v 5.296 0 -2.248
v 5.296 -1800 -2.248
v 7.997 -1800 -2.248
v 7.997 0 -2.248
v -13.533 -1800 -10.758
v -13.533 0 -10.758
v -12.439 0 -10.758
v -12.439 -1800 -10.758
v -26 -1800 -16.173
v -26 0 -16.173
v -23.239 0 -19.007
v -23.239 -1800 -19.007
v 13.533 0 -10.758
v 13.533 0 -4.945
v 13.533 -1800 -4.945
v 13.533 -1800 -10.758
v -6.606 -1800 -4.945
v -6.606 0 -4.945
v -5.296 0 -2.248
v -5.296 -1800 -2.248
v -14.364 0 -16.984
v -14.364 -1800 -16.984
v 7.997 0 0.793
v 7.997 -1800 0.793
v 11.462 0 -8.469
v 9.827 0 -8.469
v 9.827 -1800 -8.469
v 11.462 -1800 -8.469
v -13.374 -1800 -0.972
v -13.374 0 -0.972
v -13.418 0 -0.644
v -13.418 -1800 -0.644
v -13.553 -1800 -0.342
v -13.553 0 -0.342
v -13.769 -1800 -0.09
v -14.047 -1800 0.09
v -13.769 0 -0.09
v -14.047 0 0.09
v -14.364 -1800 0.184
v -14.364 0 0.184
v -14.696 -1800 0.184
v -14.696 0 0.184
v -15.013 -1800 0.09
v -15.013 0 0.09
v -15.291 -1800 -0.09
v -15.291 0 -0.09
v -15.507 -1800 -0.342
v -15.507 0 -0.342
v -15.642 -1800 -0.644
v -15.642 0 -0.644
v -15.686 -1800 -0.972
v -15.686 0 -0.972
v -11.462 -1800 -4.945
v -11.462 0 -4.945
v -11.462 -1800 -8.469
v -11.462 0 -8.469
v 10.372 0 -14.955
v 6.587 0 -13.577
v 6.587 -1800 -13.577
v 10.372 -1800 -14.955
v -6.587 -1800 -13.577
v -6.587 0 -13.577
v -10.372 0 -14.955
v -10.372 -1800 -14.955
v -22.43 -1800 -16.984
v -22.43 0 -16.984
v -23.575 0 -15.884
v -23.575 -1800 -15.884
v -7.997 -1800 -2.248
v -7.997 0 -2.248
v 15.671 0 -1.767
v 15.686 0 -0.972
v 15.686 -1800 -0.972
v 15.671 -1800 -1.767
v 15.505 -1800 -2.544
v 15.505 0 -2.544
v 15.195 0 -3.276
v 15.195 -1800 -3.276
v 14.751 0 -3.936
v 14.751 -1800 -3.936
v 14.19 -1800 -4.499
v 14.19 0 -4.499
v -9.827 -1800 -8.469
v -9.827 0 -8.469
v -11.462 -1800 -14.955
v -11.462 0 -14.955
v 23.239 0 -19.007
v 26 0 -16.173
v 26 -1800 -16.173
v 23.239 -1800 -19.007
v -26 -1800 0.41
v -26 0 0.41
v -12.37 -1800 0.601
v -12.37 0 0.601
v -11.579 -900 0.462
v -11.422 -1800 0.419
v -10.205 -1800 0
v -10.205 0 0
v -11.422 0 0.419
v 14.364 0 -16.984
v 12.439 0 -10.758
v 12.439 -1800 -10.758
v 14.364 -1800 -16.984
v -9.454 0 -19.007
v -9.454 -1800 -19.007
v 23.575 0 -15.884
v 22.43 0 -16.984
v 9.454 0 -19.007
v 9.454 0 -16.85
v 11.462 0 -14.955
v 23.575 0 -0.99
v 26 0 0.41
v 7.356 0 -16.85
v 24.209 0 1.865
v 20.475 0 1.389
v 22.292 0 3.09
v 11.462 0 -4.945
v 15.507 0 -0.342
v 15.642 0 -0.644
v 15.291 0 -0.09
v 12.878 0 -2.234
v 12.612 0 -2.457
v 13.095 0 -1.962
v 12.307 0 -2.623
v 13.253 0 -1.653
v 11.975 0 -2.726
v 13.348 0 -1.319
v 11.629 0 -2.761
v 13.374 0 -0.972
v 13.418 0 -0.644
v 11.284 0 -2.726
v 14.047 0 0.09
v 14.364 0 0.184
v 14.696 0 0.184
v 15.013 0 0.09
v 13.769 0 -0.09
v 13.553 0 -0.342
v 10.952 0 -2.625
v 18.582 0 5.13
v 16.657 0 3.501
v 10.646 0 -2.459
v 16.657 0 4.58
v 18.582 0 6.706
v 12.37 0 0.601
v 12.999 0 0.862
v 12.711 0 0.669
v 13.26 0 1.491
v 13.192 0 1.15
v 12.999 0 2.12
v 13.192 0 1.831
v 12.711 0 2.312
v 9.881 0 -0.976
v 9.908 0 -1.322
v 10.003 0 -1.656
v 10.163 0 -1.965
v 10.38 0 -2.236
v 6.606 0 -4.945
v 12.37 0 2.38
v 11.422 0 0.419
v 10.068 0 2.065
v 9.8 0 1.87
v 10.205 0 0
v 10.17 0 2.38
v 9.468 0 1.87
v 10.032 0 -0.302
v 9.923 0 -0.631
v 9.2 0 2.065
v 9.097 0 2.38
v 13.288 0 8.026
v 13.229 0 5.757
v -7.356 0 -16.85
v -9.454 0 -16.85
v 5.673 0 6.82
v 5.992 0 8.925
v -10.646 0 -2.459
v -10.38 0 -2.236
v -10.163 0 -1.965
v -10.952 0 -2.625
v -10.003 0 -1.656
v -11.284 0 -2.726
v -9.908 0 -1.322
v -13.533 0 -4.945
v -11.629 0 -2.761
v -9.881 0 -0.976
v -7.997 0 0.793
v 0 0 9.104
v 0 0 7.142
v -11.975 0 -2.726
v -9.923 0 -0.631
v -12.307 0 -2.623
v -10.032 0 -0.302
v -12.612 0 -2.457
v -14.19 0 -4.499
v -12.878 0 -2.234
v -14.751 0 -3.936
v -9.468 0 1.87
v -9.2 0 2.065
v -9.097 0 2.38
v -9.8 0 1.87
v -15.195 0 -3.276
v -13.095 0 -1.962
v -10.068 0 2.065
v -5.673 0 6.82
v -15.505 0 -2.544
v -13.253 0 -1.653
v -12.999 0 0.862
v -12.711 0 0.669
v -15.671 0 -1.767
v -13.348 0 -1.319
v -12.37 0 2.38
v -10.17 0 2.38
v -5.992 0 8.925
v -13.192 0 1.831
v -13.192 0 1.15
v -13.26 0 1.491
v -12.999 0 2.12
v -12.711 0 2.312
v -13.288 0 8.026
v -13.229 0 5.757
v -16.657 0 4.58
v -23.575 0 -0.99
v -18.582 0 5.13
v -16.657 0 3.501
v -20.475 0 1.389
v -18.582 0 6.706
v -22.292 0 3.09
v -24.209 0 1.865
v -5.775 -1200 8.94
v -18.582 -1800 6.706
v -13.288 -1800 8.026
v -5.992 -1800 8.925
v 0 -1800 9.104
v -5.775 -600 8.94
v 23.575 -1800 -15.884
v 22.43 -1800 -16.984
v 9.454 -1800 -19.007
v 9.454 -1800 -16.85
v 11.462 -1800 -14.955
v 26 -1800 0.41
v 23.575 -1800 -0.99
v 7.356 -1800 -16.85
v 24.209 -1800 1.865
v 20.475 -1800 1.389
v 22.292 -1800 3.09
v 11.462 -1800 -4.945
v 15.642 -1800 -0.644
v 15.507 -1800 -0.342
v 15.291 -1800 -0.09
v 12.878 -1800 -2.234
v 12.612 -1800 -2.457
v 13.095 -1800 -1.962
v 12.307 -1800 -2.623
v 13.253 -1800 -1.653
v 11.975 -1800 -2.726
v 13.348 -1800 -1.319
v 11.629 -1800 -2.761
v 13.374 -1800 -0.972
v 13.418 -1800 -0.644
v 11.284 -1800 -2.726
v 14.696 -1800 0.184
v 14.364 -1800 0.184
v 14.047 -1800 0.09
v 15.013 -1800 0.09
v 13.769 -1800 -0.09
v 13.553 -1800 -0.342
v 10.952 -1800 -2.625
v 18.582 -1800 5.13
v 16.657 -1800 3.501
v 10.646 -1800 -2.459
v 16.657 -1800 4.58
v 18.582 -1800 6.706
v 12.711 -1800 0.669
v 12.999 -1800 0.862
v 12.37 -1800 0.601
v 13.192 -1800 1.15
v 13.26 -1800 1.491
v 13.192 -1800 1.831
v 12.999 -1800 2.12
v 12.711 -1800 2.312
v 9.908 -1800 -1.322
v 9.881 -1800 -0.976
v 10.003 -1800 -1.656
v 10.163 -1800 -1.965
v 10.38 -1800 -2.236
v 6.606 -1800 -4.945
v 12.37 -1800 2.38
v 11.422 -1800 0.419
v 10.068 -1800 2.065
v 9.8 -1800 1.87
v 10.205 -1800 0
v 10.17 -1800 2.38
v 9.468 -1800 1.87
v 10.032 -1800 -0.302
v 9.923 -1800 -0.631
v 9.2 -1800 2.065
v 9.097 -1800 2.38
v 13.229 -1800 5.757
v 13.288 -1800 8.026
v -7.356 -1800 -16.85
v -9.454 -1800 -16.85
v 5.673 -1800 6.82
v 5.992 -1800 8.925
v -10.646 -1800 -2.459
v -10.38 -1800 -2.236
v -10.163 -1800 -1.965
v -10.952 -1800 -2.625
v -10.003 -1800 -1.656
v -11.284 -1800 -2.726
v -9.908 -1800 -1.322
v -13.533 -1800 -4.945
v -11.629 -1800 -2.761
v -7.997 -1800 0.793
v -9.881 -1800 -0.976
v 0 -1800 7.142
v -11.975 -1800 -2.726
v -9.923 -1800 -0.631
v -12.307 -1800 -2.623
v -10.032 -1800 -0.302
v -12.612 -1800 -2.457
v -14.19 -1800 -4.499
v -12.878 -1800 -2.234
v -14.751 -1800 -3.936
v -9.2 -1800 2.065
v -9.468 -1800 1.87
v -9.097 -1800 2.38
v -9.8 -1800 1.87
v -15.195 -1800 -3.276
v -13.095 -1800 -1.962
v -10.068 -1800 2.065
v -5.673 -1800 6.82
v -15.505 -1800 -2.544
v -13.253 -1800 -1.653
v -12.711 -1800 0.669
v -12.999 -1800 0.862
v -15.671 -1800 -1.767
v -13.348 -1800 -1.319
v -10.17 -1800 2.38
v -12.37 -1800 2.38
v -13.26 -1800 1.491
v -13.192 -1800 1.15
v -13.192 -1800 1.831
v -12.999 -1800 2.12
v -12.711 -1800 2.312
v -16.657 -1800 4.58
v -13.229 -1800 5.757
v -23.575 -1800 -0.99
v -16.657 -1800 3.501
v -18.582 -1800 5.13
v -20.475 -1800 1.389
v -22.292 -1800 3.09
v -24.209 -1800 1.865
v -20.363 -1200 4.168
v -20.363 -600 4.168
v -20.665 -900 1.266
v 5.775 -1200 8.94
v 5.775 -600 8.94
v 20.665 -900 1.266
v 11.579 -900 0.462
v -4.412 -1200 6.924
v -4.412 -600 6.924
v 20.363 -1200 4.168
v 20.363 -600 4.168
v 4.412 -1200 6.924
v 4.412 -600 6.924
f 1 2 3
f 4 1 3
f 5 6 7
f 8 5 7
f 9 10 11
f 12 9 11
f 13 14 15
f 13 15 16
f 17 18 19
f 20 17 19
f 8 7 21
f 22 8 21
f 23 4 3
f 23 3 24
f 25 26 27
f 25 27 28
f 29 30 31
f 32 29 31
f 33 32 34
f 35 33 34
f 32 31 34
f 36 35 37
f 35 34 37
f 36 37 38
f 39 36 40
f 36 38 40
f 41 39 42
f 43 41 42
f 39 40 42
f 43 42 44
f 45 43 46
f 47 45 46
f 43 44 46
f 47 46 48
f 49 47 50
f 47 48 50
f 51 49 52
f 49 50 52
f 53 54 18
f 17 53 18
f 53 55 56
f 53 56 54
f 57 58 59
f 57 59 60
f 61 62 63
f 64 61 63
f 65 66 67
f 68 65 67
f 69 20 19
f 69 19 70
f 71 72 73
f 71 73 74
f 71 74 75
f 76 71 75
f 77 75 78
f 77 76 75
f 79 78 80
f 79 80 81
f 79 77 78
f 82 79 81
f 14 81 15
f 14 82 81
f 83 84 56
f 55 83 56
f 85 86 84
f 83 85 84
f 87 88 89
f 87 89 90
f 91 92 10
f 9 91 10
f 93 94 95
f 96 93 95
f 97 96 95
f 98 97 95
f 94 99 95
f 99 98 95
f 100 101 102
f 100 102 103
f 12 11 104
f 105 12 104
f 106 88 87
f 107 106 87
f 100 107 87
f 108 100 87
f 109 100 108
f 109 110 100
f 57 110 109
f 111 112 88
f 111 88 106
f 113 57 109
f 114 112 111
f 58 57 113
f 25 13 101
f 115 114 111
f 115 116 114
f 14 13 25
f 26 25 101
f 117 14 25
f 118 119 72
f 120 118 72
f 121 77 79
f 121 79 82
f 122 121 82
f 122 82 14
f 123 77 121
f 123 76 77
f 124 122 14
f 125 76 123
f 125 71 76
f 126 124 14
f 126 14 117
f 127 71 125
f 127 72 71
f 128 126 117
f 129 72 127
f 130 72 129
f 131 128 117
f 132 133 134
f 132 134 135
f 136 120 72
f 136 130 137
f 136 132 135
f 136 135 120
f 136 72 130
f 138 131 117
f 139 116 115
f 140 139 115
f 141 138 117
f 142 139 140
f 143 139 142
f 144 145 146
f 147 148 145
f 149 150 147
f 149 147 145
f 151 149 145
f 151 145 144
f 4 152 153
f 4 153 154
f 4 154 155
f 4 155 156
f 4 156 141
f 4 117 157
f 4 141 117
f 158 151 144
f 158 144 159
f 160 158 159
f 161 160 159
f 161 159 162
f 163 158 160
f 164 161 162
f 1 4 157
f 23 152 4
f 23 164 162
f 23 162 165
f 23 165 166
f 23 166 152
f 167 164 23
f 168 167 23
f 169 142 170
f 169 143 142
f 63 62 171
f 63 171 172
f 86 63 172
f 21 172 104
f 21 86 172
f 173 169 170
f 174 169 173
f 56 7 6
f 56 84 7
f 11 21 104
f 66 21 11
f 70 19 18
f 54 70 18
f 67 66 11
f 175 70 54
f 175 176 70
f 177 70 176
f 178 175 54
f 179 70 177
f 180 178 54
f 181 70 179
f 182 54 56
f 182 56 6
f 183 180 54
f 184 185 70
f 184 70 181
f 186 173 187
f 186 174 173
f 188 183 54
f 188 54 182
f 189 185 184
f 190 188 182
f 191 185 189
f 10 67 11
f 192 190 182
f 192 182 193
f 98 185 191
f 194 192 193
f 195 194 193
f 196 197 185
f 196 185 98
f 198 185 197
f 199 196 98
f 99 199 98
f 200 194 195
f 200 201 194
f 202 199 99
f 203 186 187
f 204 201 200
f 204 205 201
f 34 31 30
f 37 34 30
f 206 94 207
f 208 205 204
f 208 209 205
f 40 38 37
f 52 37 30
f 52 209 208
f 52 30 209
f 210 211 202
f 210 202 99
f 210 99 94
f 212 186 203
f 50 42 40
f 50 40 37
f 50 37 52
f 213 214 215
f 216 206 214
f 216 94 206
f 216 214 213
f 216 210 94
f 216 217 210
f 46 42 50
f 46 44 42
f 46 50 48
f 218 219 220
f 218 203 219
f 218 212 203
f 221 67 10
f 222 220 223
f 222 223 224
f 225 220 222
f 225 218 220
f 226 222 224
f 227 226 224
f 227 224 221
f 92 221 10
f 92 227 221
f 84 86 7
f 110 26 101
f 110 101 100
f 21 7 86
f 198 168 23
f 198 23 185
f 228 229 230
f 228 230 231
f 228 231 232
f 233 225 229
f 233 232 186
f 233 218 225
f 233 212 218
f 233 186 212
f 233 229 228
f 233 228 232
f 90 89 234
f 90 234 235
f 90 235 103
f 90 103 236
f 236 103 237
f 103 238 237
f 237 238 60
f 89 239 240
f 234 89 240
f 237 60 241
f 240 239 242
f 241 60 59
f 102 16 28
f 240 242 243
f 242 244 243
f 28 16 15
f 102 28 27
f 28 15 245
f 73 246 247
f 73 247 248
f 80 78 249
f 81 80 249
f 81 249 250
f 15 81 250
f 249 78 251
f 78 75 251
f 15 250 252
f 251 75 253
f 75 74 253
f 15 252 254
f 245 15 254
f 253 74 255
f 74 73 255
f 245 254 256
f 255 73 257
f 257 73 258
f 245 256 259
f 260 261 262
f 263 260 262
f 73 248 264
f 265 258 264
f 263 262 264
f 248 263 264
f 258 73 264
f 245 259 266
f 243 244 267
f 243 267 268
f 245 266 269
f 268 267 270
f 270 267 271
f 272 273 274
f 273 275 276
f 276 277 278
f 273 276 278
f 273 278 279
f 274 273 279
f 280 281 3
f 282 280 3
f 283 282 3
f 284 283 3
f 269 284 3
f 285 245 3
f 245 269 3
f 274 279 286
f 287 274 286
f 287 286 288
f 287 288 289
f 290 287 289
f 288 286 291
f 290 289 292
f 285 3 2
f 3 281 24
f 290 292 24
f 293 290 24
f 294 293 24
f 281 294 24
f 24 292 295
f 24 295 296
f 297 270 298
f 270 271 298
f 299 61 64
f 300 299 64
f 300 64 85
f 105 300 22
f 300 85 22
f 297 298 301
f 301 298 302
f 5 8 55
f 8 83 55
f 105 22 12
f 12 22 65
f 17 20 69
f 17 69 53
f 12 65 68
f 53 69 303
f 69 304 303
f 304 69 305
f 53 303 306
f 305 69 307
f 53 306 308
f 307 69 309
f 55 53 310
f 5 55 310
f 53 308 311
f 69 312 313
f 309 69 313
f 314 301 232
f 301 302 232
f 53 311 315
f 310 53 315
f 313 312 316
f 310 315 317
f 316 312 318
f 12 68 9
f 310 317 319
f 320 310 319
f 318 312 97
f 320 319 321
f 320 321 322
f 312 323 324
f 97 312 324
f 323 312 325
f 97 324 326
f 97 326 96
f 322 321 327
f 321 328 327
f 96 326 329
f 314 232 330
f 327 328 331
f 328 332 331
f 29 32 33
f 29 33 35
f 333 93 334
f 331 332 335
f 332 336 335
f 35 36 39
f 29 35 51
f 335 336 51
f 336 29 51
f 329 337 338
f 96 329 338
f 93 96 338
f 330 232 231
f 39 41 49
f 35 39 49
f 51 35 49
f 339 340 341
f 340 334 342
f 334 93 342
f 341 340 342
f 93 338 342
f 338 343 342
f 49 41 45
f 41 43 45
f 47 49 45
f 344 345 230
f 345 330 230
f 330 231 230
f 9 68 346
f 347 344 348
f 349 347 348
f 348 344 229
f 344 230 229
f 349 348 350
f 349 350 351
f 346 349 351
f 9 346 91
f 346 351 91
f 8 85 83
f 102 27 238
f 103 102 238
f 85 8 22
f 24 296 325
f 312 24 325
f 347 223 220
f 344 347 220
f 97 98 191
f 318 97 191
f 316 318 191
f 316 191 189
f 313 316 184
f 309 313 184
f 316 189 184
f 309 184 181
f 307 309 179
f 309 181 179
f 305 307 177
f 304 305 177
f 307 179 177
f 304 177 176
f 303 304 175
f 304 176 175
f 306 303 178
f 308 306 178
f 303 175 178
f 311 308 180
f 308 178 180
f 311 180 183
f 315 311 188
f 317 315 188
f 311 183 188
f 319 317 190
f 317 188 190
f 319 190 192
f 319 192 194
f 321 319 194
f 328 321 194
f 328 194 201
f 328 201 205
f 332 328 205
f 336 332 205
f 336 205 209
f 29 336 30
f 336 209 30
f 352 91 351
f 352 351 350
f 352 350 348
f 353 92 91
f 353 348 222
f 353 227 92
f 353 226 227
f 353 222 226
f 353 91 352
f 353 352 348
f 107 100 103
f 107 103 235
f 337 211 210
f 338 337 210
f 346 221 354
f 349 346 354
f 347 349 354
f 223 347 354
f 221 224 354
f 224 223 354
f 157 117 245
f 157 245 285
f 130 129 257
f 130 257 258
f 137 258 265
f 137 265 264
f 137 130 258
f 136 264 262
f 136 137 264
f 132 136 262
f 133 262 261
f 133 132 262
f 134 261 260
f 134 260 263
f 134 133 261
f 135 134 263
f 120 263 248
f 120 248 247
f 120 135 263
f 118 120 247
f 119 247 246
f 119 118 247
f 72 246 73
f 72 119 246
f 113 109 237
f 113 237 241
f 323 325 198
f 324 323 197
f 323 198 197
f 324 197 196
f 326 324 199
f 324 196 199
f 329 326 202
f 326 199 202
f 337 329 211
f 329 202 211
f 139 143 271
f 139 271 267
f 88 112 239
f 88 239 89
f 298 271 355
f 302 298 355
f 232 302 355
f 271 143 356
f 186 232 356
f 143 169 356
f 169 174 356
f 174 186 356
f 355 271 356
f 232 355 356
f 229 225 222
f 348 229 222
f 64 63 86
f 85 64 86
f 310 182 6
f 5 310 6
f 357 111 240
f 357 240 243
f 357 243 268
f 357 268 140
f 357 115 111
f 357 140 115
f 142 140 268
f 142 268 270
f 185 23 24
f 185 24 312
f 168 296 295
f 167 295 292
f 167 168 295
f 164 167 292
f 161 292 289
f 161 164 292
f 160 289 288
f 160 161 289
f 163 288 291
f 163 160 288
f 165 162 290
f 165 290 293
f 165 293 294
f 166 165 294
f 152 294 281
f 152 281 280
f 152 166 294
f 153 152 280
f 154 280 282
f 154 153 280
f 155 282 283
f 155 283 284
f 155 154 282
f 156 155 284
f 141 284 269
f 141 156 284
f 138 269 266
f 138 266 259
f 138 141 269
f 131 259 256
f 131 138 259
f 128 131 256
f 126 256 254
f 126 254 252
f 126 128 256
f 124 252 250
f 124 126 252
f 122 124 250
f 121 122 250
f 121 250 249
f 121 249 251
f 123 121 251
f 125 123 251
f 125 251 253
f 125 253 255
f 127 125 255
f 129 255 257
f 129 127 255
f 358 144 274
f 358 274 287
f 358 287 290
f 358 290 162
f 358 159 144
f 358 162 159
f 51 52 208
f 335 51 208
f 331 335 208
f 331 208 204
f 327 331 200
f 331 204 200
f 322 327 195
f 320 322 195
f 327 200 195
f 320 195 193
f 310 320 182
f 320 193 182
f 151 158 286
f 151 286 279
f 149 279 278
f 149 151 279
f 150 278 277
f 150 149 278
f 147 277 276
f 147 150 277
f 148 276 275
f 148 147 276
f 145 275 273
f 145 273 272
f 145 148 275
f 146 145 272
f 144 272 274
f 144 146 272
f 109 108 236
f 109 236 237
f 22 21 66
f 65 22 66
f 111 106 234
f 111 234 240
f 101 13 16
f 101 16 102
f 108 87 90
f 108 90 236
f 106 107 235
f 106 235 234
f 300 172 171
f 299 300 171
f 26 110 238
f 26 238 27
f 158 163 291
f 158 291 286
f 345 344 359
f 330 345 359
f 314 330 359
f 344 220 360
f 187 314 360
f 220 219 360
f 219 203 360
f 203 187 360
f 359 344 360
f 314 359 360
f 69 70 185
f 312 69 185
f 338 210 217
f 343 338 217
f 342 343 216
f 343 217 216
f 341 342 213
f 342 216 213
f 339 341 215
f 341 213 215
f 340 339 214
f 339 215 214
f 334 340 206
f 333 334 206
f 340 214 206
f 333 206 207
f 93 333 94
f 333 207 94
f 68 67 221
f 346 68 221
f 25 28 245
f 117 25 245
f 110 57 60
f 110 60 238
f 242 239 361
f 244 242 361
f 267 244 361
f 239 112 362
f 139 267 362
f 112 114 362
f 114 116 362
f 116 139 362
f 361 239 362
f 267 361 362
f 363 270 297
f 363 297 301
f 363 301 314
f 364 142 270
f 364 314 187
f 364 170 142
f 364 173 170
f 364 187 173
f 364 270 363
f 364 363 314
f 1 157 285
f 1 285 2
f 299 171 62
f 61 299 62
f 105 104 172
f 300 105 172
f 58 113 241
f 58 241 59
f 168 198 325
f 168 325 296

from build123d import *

# Parameters (mm, degrees)
F1_DEPTH = 1800


with BuildPart() as f1:
    # F0 (on Front) → F1 (new body)
    with BuildSketch(Plane.XZ):
        with BuildLine():
            Line((-7.9969227636, -2.2478350473), (-7.9969227636, 0.7932551553))
            Line((-7.9969227636, 0.7932551553), (0.0459905117, 0.7932551553))
            Line((0.0459905117, 0.7932551553), (0.0459905117, 2.3800082379))
            Line((0.0459905117, 2.3800082379), (-9.0970324447, 2.3800082379))
            ThreePointArc((-9.0970324447, 2.3800082379), (-9.6336982741, 1.8433424086), (-10.1703641034, 2.3800082379))
            Line((-10.1703641034, 2.3800082379), (-12.3701348422, 2.3800082379))
            ThreePointArc((-12.3701348422, 2.3800082379), (-13.2595523658, 1.4905907143), (-12.3701348422, 0.6011731907))
            add(Edge.make_bspline(
                [(-12.3701348422, 0.6011731907), (-12.1228129616, 0.5691521849), (-11.5433422221, 0.4941275414), (-10.6924791091, 0.1800355097), (-10.2047699068, 0)],
                knots=[0, 0, 0, 0, 0.4268065041, 1, 1, 1, 1], degree=3))
            ThreePointArc((-10.2047699068, 0), (-11.1152235093, -2.6837504686), (-13.3740623856, -0.9722922392))
            Line((-13.3740623856, -0.9722922392), (-15.6857306961, -0.9722922392))
            ThreePointArc((-15.6857306961, -0.9722922392), (-15.1946820558, -3.2760979159), (-13.532761484, -4.945429931))
            Line((-13.532761484, -4.945429931), (-13.532761484, -10.7581925882))
            Line((-13.532761484, -10.7581925882), (-12.4391342032, -10.7581925882))
            Line((-12.4391342032, -10.7581925882), (-14.3639348651, -16.9839935943))
            Line((-14.3639348651, -16.9839935943), (-22.429763532, -16.9839935943))
            Line((-22.429763532, -16.9839935943), (-23.5754768726, -15.8841076624))
            Line((-23.5754768726, -15.8841076624), (-23.5754768726, -0.9898235486))
            add(Edge.make_bspline(
                [(-23.5754768726, -0.9898235486), (-22.6586938501, -0.2180588848), (-20.7184800237, 1.4152484897), (-18.0593931921, 2.7805943387), (-16.6567687304, 3.5007917628)],
                knots=[0, 0, 0, 0, 0.4725164876, 1, 1, 1, 1], degree=3))
            Line((-16.6567687304, 3.5007917628), (-16.6567687304, 4.5798297725))
            add(Edge.make_bspline(
                [(-16.6567687304, 4.5798297725), (-15.6710688835, 5.0009508786), (-13.1703865293, 6.0693188227), (-4.3758690531, 7.0085577977), (-1.2828857884, 7.1027256627), (0, 7.1417839457)],
                knots=[0, 0, 0, 0, 0.2757658405, 0.6996072623, 1, 1, 1, 1], degree=3))
            Line((0, 7.1417839457), (0, 9.1037720633))
            add(Edge.make_bspline(
                [(-18.582212805, 6.7057863363), (-17.2868311529, 7.1005286698), (-14.210807771, 8.0378868962), (-5.7227418129, 9.0912644328), (-1.7804404056, 9.0998807309), (0, 9.1037720633)],
                knots=[0, 0, 0, 0, 0.2851690949, 0.6771647586, 1, 1, 1, 1], degree=3))
            Line((-18.582212805, 6.7057863363), (-18.582212805, 5.1303458482))
            add(Edge.make_bspline(
                [(-26, 0.4100030183), (-25.3422499449, 0.9811093773), (-23.9006086818, 2.2328470038), (-20.3903638593, 4.1574315556), (-19.1135432108, 4.8444521754), (-18.582212805, 5.1303458482)],
                knots=[0, 0, 0, 0, 0.3288189571, 0.7206977375, 1, 1, 1, 1], degree=3))
            Line((-26, 0.4100030183), (-26, -16.1727615082))
            Line((-26, -16.1727615082), (-23.2389877654, -19.0067448447))
            Line((-23.2389877654, -19.0067448447), (-9.4540094883, -19.0067448447))
            Line((-9.4540094883, -19.0067448447), (-9.4540094883, -16.8500962567))
            Line((-9.4540094883, -16.8500962567), (-7.3556309386, -16.8500962567))
            Line((-7.3556309386, -16.8500962567), (-6.5869867008, -13.5773369376))
            Line((-6.5869867008, -13.5773369376), (-10.3717816277, -14.9546653609))
            Line((-10.3717816277, -14.9546653609), (-11.4617745264, -14.9546653609))
            Line((-11.4617745264, -14.9546653609), (-9.8267851783, -8.469206826))
            Line((-9.8267851783, -8.469206826), (-11.4617745264, -8.469206826))
            Line((-11.4617745264, -8.469206826), (-11.4617745264, -4.945429931))
            Line((-11.4617745264, -4.945429931), (-6.6061029203, -4.945429931))
            Line((-6.6061029203, -4.945429931), (-5.2958418371, -2.2478350473))
            Line((-5.2958418371, -2.2478350473), (-7.9969227636, -2.2478350473))
        make_face()
        with BuildLine():
            Line((-15.6857306961, -0.9722922392), (-13.3740623856, -0.9722922392))
            ThreePointArc((-13.3740623856, -0.9722922392), (-14.5298965409, 0.1959221176), (-15.6857306961, -0.9722922392))
        make_face()
    extrude(amount=F1_DEPTH)

    # F2: F1 across plane


with BuildPart() as f1_1:
    add(f1.part)
    add(f1.part.mirror(Plane.YZ))


solid = f1_1.part
